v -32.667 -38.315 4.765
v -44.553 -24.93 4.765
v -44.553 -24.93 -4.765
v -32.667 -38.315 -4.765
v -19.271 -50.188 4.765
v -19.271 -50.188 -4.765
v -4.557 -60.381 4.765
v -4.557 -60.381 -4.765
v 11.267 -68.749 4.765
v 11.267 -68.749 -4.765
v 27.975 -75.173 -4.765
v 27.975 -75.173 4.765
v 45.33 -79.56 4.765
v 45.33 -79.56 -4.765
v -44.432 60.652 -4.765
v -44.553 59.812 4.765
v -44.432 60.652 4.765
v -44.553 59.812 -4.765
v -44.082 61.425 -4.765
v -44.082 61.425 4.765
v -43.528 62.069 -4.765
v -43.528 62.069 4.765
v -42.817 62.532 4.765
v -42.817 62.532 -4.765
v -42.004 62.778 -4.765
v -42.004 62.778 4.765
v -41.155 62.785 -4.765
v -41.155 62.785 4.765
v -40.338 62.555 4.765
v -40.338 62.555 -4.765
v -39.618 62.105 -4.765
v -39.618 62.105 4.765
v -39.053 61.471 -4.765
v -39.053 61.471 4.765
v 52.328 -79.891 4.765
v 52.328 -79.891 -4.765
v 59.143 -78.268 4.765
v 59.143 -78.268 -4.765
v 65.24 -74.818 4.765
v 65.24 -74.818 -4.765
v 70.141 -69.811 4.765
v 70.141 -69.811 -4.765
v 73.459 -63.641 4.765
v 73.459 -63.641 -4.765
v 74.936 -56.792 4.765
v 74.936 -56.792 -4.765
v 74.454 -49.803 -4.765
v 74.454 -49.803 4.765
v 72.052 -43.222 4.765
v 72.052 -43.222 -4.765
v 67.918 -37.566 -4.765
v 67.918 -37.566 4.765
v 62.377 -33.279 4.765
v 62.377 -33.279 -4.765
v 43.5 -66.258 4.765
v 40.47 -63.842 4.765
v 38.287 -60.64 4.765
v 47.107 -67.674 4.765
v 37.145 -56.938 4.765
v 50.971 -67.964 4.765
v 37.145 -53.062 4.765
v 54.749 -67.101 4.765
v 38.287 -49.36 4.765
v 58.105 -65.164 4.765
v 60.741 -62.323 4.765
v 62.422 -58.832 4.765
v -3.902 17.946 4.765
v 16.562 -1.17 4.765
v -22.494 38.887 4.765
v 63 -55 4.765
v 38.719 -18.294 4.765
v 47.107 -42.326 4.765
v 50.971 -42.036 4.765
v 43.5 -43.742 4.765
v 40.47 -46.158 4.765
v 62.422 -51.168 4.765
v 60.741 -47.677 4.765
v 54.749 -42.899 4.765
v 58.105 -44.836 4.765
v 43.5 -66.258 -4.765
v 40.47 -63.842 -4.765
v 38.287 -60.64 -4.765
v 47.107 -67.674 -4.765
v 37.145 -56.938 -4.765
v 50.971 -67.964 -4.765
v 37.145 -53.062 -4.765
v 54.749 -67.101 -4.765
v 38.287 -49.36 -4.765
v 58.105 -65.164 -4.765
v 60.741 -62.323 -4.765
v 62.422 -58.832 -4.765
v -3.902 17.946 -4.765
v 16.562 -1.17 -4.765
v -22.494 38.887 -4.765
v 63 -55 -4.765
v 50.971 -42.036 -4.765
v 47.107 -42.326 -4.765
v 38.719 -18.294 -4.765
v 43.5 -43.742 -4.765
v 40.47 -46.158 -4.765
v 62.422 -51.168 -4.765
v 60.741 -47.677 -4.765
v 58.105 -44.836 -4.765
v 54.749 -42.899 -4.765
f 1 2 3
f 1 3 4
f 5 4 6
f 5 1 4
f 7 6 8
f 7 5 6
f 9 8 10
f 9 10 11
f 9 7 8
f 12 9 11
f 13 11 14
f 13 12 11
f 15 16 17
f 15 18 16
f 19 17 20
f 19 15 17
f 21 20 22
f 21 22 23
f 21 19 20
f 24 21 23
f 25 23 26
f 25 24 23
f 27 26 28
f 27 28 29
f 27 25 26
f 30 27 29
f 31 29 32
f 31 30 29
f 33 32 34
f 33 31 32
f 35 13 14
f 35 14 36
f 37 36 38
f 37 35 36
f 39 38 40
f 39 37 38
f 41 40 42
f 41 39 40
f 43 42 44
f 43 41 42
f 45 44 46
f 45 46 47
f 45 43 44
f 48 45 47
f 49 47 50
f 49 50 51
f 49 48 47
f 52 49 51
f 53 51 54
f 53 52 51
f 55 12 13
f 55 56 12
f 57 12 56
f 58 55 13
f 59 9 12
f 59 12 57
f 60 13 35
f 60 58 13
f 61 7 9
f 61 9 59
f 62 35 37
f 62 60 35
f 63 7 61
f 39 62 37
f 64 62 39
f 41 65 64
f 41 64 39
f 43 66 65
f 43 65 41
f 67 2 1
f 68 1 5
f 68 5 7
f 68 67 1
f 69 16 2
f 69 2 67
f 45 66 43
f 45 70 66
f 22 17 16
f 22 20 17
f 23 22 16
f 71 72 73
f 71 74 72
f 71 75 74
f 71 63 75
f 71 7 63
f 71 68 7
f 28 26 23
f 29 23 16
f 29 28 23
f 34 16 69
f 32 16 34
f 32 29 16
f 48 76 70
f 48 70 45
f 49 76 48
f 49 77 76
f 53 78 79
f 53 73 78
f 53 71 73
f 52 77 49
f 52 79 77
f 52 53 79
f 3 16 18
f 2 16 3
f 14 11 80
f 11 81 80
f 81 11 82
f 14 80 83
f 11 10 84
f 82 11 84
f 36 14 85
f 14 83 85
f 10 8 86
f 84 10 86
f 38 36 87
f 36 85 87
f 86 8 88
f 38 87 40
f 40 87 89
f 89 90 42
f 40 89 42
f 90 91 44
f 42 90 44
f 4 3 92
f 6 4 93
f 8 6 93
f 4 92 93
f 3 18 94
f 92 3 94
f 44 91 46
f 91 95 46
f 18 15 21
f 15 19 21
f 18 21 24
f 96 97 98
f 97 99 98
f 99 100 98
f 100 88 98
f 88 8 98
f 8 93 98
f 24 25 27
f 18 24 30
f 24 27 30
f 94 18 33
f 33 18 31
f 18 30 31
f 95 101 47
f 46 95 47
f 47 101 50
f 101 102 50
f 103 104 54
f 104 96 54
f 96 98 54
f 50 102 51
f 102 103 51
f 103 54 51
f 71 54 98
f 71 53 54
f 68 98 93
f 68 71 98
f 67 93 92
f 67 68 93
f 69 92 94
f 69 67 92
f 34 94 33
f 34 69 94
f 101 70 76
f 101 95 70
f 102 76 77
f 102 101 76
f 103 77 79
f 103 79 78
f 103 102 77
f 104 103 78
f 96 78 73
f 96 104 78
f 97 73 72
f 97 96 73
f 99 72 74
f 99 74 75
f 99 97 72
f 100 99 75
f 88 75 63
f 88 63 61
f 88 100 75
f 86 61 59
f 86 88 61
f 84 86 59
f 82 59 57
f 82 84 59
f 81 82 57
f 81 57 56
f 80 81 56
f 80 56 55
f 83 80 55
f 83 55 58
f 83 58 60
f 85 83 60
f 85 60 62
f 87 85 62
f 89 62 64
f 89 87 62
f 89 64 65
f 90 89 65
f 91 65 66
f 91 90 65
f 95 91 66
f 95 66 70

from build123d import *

# Parameters (mm, degrees)
CROQUIS1_R              = 13
SALIENTE_EXTRUIR1_DEPTH = 4.765
REDONDEO2_R             = 3


with BuildPart() as part:
    # Croquis1 → Saliente-Extruir1 (new, symmetric)
    with BuildSketch(Plane.XY):
        with BuildLine():
            Line((-44.5526077, 70.070188004), (-44.5526077, -24.929811996))
            ThreePointArc((-44.5526077, -24.929811996), (-4.556794057, -60.38146366), (45.329796291, -79.559910369))
            ThreePointArc((45.329796291, -79.559910369), (73.459258652, -63.640786047), (62.376657562, -33.278620035))
            ThreePointArc((62.376657562, -33.278620035), (2.406760274, 11.66514835), (-44.5526077, 70.070188004))
        make_face()
        with Locations((50, -55)):
            Circle(CROQUIS1_R, mode=Mode.SUBTRACT)
    extrude(amount=SALIENTE_EXTRUIR1_DEPTH, both=True)

    # Redondeo2
    redondeo2_edges = [part.edges().sort_by_distance(p)[0] for p in [
        (-44.5526077, 70.070188004, 0),
    ]]
    fillet(redondeo2_edges, radius=REDONDEO2_R)


solid = part.part
